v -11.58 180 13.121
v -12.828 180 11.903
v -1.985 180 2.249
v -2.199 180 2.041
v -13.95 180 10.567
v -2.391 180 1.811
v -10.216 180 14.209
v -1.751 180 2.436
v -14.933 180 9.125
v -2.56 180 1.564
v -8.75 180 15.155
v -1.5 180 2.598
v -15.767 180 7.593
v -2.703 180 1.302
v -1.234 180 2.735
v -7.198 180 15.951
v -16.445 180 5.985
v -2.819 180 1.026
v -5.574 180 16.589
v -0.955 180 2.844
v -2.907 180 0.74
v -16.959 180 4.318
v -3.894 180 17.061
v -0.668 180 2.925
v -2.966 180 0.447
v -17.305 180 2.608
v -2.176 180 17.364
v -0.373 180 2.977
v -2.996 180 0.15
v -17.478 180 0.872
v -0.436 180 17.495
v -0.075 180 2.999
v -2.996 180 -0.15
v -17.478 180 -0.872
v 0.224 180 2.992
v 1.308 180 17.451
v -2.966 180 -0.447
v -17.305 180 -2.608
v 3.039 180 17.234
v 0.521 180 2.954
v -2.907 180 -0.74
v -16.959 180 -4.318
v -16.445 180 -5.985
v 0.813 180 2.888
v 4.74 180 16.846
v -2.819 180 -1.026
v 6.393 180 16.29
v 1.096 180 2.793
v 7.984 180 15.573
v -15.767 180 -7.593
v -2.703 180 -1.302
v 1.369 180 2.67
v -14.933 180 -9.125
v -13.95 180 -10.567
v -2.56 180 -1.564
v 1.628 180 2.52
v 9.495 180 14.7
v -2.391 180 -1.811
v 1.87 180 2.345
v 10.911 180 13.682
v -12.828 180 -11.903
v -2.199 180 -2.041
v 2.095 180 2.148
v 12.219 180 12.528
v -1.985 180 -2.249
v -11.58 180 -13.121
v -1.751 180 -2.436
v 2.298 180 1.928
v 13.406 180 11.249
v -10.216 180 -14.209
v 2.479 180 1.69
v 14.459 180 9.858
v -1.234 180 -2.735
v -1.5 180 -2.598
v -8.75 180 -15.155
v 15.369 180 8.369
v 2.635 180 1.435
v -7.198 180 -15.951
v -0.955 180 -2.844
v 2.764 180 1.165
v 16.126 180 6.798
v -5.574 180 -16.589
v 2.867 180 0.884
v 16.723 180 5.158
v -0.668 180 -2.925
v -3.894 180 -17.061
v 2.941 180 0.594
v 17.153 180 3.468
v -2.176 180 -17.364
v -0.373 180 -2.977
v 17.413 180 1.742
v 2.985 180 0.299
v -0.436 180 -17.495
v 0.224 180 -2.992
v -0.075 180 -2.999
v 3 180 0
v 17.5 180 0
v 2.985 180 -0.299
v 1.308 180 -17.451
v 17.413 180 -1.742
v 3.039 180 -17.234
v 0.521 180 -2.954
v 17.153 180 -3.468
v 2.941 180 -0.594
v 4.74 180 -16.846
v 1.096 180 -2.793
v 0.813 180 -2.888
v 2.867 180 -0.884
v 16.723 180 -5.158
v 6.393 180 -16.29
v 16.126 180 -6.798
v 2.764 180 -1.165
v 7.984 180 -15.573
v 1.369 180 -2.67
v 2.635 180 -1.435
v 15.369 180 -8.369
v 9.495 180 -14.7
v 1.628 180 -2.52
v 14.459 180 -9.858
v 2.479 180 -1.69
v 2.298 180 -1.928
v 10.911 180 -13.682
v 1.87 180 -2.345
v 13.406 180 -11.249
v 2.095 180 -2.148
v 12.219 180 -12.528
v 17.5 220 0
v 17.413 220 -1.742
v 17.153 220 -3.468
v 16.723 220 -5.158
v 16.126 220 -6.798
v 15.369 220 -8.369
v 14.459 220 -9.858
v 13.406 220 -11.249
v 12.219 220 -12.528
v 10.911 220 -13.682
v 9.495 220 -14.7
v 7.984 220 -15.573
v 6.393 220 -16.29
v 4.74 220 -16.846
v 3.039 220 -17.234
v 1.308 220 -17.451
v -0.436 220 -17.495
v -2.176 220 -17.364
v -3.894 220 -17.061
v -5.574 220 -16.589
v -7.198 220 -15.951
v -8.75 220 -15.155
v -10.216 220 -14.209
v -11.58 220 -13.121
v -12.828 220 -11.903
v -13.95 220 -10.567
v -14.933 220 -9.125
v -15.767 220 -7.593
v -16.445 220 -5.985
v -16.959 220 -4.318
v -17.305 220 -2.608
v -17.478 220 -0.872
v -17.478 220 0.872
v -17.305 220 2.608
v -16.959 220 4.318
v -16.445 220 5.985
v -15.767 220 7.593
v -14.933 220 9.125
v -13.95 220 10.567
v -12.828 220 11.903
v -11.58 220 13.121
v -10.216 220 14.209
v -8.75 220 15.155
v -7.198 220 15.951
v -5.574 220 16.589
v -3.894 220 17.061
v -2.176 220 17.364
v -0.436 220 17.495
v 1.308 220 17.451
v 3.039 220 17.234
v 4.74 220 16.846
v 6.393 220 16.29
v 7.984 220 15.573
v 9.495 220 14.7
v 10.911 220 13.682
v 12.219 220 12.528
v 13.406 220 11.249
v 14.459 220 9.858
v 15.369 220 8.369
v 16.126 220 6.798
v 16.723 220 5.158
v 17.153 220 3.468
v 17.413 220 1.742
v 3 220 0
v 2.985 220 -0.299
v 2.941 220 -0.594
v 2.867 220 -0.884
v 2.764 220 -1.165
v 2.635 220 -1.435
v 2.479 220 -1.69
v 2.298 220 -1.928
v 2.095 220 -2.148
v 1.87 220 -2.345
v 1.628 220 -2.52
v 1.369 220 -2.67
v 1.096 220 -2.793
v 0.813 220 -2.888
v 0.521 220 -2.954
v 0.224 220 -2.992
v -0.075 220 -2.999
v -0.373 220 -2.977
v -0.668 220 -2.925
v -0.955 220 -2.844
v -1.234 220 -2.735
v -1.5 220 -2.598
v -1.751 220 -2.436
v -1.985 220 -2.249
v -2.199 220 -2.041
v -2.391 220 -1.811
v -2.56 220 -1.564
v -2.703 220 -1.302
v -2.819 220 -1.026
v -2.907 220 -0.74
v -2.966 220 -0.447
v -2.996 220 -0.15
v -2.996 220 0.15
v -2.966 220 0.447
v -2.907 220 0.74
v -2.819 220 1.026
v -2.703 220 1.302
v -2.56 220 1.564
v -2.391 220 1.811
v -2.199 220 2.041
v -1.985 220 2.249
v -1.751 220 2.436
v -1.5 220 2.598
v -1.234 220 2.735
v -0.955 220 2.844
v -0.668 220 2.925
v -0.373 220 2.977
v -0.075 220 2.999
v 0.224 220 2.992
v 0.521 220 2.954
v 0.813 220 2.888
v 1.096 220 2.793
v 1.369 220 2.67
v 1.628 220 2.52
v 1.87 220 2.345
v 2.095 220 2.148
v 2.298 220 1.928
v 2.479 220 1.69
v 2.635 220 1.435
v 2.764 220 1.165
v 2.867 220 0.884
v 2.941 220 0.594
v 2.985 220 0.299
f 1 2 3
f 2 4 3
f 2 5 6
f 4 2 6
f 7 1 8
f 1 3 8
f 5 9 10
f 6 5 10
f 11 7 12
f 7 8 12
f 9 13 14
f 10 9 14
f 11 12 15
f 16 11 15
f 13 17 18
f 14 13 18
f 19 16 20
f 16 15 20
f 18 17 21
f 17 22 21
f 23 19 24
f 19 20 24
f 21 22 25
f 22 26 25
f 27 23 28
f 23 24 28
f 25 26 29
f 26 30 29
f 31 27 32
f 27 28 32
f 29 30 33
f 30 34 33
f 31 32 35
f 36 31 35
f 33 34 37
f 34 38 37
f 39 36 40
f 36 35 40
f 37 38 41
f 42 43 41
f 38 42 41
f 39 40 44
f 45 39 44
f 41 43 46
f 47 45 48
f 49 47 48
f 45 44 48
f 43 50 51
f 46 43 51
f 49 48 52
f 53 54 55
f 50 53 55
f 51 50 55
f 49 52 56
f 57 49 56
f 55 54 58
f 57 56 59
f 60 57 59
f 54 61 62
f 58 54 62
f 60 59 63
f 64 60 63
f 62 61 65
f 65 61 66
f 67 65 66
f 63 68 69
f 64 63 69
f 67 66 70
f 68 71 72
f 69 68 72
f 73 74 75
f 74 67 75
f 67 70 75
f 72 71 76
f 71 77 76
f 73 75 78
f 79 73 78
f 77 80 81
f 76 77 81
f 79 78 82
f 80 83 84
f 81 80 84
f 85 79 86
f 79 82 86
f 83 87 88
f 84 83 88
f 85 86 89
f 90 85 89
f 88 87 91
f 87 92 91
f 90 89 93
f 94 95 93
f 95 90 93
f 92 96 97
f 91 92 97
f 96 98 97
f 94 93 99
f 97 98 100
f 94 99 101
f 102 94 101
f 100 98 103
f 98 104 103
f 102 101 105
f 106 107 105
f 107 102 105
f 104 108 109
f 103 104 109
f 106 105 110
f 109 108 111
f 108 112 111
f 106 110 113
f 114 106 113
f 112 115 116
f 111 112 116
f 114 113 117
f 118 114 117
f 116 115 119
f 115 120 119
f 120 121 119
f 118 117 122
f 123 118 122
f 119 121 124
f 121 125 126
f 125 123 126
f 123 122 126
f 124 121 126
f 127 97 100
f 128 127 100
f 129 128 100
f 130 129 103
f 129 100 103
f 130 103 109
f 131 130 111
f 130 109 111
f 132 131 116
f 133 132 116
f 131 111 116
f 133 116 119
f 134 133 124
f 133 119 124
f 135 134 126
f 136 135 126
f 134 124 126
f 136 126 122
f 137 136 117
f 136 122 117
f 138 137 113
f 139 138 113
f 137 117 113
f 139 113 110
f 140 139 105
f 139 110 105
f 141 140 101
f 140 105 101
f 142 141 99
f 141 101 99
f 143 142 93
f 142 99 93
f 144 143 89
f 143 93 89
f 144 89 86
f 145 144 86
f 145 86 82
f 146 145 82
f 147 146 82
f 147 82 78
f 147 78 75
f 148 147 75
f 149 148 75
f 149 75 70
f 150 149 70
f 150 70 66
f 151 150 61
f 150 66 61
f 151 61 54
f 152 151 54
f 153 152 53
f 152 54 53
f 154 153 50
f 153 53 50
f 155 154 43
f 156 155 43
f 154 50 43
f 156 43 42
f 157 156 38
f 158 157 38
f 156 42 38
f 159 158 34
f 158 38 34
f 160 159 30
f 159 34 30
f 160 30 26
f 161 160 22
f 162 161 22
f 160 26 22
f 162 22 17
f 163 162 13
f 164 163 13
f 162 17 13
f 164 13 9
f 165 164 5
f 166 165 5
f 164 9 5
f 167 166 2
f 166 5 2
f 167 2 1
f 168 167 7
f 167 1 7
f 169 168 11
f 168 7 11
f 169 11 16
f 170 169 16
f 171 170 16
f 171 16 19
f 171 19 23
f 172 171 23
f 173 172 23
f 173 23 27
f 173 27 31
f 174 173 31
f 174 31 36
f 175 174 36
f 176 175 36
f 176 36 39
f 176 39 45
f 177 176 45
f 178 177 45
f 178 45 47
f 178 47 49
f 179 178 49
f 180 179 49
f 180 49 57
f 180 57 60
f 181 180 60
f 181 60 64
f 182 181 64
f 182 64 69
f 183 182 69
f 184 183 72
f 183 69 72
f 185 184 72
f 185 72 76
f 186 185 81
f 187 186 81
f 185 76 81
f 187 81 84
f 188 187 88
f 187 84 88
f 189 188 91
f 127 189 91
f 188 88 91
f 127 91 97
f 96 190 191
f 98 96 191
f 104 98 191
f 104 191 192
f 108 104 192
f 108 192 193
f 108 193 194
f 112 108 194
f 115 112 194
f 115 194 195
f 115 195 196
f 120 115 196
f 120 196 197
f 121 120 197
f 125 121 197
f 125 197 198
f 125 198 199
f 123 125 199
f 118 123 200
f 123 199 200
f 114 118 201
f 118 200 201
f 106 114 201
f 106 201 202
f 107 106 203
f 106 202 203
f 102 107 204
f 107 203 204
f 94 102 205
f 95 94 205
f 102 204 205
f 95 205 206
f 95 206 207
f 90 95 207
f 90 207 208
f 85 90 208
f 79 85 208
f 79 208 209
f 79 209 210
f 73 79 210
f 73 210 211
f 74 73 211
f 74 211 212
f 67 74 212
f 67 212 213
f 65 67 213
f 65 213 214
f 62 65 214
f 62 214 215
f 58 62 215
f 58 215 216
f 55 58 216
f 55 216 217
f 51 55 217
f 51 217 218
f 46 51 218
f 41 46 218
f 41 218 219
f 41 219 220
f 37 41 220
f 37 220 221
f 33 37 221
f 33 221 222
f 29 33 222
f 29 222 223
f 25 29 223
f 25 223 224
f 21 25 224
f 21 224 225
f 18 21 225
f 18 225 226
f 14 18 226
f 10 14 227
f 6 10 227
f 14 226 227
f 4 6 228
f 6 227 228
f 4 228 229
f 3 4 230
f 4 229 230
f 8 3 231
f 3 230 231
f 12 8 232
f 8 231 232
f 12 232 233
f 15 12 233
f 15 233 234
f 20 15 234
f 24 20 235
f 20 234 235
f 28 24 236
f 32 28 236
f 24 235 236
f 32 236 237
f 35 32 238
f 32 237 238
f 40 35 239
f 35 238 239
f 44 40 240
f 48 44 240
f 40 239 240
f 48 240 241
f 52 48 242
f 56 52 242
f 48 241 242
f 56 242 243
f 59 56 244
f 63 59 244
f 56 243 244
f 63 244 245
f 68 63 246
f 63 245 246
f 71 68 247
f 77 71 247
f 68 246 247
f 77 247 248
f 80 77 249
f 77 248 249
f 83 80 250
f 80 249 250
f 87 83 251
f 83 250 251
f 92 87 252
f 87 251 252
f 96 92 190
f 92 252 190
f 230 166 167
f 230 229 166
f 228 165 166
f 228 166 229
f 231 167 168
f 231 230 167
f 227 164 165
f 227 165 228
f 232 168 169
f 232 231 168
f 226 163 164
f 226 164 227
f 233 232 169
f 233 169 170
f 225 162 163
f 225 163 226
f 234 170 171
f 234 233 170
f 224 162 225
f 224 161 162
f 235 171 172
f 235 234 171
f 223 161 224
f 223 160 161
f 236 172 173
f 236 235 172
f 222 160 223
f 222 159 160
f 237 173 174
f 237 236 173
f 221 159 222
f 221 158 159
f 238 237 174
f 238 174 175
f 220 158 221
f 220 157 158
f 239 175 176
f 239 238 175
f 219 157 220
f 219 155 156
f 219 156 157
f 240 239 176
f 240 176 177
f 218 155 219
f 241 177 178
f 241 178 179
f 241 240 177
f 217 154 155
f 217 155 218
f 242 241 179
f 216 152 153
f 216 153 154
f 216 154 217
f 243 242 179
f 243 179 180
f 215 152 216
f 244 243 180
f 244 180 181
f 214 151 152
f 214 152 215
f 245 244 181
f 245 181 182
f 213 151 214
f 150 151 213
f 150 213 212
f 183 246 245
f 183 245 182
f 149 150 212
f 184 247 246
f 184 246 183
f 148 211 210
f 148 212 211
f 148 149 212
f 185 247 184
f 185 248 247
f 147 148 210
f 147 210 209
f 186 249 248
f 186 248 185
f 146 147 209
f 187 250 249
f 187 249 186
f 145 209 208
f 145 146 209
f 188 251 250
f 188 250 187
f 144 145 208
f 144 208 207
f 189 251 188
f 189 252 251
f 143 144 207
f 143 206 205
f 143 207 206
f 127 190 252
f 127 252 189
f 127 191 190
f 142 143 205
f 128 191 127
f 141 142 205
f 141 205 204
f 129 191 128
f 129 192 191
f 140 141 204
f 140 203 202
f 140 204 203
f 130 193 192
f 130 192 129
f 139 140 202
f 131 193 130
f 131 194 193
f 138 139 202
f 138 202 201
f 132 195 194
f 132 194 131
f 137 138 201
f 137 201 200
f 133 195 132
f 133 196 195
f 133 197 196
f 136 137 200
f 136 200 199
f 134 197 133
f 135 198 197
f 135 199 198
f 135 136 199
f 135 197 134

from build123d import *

# Parameters (mm, degrees)
SKETCH1_R           = 175
BOSS_EXTRUDE1_DEPTH = 400
SCALE1_SCALE        = 0.1
SKETCH3_R           = 3
CUT_EXTRUDE1_DEPTH  = 41


with BuildPart() as part:
    # Sketch1 → Boss-Extrude1 (new body)
    with BuildSketch(Plane(origin=(0, 0, 0), x_dir=(1, 0, 0), z_dir=(0, 1, 0))):
        Circle(SKETCH1_R)
    extrude(amount=BOSS_EXTRUDE1_DEPTH)


with BuildPart() as part_1:
    # Scale1: scaled about (0, 200, 0)
    add(part.part.scale(SCALE1_SCALE).moved(Location((0, 180, 0))))

    # Sketch3 → Cut-Extrude1 (cut, through all)
    with BuildSketch(Plane(origin=(0, 220, 0), x_dir=(1, 0, 0), z_dir=(0, 1, 0))):
        Circle(SKETCH3_R)
    extrude(amount=-CUT_EXTRUDE1_DEPTH, mode=Mode.SUBTRACT)


solid = part_1.part
